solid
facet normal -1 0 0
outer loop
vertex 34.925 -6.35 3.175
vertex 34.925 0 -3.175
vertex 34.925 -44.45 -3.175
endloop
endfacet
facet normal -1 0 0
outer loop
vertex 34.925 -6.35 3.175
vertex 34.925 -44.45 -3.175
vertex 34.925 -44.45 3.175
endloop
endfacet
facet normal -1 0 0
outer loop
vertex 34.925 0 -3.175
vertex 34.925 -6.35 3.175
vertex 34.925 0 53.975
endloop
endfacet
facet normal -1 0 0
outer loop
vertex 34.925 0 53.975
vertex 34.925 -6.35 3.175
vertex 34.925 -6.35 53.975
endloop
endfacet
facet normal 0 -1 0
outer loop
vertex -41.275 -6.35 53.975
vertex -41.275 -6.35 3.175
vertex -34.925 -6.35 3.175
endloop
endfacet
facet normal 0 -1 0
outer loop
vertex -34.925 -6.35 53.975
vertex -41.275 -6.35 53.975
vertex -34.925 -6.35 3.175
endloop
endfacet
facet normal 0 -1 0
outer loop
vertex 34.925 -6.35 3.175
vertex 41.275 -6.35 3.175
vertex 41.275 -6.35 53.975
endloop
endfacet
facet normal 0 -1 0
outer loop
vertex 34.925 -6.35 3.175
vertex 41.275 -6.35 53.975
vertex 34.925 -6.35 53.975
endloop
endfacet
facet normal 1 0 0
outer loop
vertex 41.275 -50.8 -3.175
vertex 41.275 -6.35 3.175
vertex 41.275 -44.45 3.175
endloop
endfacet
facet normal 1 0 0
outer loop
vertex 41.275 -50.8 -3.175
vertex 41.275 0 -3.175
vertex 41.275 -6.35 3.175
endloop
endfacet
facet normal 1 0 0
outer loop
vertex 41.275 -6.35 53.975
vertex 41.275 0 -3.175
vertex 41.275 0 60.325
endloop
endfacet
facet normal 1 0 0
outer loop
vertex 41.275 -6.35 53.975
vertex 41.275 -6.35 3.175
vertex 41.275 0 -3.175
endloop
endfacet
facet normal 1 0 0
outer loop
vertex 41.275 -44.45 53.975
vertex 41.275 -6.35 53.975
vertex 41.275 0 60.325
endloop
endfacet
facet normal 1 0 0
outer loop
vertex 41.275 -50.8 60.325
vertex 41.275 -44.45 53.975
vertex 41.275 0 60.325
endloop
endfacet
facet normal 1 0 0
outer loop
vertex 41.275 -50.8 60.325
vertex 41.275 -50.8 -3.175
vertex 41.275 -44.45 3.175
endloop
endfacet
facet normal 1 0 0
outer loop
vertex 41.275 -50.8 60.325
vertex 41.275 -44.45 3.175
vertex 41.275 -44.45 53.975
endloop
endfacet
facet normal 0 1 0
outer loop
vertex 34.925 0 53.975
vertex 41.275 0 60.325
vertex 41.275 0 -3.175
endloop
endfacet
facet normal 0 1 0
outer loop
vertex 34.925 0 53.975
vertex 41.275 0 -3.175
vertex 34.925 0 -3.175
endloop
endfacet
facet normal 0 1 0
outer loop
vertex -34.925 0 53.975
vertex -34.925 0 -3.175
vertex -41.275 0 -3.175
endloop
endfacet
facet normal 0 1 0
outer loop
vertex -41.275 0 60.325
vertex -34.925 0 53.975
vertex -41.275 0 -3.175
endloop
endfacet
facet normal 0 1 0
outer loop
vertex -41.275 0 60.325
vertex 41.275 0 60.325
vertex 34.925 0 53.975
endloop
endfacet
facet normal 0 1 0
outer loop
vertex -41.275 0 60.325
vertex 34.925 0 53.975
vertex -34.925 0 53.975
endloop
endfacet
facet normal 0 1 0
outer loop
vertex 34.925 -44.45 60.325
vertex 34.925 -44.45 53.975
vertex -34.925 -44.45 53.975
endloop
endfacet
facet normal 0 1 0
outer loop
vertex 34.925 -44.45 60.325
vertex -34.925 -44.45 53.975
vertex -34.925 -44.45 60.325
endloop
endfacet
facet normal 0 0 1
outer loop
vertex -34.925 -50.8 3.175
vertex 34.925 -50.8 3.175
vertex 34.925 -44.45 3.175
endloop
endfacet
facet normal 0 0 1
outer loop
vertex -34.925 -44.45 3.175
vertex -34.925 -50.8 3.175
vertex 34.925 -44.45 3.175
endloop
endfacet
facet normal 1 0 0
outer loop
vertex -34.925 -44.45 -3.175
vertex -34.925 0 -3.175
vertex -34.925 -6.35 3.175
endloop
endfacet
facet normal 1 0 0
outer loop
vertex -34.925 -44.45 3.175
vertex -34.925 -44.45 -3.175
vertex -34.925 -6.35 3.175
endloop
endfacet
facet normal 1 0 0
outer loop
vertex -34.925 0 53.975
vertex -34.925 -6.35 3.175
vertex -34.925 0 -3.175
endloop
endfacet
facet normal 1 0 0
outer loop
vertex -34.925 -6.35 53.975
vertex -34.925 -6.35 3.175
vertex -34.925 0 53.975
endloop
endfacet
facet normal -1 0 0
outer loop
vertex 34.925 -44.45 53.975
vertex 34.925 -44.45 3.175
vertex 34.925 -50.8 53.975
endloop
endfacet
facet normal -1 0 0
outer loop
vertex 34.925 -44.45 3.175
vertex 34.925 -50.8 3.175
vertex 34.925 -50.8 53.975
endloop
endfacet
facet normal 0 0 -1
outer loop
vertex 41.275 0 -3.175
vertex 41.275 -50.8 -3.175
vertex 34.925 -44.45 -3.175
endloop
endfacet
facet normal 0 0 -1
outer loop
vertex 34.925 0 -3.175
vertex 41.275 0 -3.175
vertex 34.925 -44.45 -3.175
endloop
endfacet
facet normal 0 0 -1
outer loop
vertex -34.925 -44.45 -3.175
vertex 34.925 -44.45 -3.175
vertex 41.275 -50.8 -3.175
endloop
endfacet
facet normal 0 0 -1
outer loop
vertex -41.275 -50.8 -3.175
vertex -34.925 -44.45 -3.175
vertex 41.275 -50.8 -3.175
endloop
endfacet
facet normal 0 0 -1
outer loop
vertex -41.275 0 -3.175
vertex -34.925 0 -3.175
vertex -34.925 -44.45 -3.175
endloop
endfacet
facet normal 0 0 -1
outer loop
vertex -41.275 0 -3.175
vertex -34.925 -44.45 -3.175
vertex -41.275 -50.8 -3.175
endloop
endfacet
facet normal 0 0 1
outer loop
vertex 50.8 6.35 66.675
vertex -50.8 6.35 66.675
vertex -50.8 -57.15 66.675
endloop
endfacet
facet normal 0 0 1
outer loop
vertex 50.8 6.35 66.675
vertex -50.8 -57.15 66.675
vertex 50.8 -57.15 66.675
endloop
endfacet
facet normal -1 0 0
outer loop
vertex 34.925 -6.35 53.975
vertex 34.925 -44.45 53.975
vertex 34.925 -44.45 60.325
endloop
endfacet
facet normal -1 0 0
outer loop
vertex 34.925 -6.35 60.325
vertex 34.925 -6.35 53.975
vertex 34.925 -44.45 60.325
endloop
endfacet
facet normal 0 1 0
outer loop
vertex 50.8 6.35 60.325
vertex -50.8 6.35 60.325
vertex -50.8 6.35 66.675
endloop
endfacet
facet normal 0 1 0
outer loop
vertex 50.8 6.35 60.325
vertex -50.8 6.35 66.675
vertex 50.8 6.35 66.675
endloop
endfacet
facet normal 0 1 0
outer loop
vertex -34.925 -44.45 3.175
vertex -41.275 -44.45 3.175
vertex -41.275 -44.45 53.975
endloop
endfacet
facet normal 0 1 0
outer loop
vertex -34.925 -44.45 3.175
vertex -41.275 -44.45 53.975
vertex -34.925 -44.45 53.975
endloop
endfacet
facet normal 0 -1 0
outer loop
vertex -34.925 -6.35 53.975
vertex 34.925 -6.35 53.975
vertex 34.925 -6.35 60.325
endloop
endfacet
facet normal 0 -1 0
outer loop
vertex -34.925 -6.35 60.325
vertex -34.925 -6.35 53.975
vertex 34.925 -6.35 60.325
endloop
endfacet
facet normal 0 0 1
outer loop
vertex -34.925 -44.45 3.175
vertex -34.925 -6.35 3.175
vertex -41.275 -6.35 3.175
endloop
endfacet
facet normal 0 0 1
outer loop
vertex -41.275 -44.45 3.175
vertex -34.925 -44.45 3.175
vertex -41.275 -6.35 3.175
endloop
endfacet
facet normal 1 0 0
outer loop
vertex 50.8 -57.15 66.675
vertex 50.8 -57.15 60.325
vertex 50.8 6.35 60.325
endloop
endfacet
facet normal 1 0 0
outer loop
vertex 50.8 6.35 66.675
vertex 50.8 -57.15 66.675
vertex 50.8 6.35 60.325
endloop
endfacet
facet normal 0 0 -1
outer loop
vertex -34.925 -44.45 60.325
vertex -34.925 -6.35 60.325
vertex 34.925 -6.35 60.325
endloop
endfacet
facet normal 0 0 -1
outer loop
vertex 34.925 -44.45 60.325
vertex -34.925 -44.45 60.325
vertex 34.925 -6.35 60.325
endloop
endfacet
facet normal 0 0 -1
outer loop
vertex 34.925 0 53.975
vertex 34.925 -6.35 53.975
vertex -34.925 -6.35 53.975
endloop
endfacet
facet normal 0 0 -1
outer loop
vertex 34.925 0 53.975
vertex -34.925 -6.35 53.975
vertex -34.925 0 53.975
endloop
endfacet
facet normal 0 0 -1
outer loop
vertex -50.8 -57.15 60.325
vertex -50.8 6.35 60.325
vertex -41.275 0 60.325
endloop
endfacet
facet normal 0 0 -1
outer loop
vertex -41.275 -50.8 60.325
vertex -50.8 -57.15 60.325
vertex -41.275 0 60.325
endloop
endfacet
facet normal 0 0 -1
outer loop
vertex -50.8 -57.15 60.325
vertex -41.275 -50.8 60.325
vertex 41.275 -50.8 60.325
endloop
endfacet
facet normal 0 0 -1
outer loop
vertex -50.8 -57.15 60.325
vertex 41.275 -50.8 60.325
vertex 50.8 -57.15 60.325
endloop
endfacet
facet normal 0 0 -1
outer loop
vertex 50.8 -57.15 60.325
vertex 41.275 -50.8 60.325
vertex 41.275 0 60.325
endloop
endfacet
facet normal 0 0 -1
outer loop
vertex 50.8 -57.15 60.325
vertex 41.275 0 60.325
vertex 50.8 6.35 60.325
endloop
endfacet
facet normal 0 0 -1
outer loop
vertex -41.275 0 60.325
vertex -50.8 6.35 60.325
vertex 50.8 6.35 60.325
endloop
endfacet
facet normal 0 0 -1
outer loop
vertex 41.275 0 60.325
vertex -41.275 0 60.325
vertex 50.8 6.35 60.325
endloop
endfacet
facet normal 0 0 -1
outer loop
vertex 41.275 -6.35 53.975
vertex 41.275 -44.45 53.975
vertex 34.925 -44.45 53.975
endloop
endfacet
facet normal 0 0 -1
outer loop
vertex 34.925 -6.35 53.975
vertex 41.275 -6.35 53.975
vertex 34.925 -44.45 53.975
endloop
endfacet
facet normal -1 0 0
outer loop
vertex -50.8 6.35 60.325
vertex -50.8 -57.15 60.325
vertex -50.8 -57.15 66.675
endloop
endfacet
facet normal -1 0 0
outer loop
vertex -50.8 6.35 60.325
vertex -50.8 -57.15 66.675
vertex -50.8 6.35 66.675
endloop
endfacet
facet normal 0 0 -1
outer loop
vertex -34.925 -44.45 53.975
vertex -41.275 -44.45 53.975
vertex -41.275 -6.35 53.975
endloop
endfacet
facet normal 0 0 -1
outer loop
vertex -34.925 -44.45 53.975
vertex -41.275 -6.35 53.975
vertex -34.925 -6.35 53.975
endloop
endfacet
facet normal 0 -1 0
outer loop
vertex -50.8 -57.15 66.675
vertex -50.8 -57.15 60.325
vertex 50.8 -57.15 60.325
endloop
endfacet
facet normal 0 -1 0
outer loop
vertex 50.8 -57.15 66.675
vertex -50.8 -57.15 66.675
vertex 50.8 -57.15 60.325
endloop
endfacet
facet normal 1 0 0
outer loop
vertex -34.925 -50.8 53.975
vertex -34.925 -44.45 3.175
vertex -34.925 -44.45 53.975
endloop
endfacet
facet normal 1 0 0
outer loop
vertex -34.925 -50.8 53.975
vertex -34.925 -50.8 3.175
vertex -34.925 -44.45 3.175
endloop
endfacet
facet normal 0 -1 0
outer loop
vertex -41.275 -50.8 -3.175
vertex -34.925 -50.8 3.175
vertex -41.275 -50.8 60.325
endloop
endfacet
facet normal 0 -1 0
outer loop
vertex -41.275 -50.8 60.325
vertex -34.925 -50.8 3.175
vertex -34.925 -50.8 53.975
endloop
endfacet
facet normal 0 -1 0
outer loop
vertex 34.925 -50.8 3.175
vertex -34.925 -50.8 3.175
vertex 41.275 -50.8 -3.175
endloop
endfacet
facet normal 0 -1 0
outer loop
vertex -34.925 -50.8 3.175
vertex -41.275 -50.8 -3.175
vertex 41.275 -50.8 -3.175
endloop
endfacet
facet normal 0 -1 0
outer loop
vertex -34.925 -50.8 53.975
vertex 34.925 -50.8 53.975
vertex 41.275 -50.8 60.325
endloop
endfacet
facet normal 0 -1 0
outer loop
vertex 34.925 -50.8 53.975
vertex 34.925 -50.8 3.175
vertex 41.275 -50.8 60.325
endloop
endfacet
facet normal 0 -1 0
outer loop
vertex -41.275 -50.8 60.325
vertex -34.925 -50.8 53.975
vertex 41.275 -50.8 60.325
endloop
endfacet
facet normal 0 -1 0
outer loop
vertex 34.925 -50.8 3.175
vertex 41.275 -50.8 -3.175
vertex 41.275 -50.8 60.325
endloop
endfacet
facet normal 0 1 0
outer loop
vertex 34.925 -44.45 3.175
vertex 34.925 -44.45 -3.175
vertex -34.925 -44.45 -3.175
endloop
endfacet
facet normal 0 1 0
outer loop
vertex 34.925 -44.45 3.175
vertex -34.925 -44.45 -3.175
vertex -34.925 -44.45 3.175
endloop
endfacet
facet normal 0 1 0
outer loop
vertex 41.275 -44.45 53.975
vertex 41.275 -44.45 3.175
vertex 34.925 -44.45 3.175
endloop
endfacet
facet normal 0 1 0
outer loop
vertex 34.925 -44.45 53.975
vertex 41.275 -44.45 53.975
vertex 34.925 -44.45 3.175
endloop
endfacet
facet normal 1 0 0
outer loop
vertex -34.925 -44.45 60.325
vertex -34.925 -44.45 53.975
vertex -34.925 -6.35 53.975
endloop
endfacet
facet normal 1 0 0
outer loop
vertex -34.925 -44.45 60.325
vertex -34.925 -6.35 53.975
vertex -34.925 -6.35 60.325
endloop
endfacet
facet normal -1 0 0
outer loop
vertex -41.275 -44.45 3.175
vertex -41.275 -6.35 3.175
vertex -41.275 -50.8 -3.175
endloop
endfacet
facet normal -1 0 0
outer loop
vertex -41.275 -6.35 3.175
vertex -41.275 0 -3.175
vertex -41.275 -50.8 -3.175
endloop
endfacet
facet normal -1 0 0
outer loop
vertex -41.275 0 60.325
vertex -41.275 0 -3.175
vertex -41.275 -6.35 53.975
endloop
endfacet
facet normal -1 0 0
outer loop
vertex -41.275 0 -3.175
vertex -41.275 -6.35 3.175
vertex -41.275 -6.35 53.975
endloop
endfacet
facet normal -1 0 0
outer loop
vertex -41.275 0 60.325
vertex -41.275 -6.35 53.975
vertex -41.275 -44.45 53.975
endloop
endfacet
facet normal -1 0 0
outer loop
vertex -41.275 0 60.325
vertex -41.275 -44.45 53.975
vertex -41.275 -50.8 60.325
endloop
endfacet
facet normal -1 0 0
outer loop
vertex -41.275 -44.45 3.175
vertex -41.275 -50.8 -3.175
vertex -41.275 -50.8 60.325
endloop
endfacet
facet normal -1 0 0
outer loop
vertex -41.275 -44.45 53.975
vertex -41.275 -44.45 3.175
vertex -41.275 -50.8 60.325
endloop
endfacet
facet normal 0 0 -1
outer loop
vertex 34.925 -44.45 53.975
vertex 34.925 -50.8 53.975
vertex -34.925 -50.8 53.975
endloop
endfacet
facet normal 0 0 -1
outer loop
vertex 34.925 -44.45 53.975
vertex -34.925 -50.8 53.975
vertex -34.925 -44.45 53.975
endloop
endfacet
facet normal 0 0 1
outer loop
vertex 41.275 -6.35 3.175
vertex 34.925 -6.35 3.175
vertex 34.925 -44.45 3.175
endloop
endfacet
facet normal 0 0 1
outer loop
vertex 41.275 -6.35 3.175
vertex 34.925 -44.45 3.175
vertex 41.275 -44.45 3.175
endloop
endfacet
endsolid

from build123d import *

# Parameters (mm, degrees)
F1_DEPTH  = 50.8
F2_W      = 6.35
F2_H      = 6.35
F3_DEPTH  = 50.8
F4_W      = 6.35
F4_H      = 6.35
F5_DEPTH  = 50.8
F6_W      = 6.35
F6_H      = 6.35
F7_DEPTH  = 34.925
F9_W      = 101.6
F9_H      = 63.5
F10_DEPTH = 6.35


with BuildPart() as f1:
    # F0 (on Front) → F1 (new body)
    with BuildSketch(Plane.XZ):
        Polygon((-41.275, -3.175), (-34.925, -3.175), (-34.925, 0), (-34.925, 3.175), (-41.275, 3.175), align=None)
    extrude(amount=F1_DEPTH)

    # F2 (on face) → F3 (join)
    with BuildSketch(Plane.XY.offset(3.175)):
        with Locations((-38.1, -3.175)):
            Rectangle(F2_W, F2_H)
        with Locations((-38.1, -47.625)):
            Rectangle(F2_W, F2_H)
    extrude(amount=F3_DEPTH)

    # F4 (on face) → F5 (join)
    with BuildSketch(Plane.XZ.offset(50.8)):
        with Locations((-38.1, 57.15)):
            Rectangle(F4_W, F4_H)
    extrude(amount=-F5_DEPTH)

    # F6 (on face) → F7 (join)
    with BuildSketch(Plane.YZ.offset(-34.925)):
        with Locations((-47.625, 57.15)):
            Rectangle(F6_W, F6_H)
        with Locations((-3.175, 57.15)):
            Rectangle(F6_W, F6_H)
        with Locations((-47.625, 0)):
            Rectangle(F6_W, F6_H)
    extrude(amount=F7_DEPTH)

    # F8: F1 across plane


with BuildPart() as f1_1:
    add(f1.part)
    add(f1.part.mirror(Plane.YZ))

    # F9 (on face) → F10 (join)
    with BuildSketch(Plane.XY.offset(60.325)):
        with Locations((0, -25.4)):
            Rectangle(F9_W, F9_H)
    extrude(amount=F10_DEPTH)


solid = f1_1.part
